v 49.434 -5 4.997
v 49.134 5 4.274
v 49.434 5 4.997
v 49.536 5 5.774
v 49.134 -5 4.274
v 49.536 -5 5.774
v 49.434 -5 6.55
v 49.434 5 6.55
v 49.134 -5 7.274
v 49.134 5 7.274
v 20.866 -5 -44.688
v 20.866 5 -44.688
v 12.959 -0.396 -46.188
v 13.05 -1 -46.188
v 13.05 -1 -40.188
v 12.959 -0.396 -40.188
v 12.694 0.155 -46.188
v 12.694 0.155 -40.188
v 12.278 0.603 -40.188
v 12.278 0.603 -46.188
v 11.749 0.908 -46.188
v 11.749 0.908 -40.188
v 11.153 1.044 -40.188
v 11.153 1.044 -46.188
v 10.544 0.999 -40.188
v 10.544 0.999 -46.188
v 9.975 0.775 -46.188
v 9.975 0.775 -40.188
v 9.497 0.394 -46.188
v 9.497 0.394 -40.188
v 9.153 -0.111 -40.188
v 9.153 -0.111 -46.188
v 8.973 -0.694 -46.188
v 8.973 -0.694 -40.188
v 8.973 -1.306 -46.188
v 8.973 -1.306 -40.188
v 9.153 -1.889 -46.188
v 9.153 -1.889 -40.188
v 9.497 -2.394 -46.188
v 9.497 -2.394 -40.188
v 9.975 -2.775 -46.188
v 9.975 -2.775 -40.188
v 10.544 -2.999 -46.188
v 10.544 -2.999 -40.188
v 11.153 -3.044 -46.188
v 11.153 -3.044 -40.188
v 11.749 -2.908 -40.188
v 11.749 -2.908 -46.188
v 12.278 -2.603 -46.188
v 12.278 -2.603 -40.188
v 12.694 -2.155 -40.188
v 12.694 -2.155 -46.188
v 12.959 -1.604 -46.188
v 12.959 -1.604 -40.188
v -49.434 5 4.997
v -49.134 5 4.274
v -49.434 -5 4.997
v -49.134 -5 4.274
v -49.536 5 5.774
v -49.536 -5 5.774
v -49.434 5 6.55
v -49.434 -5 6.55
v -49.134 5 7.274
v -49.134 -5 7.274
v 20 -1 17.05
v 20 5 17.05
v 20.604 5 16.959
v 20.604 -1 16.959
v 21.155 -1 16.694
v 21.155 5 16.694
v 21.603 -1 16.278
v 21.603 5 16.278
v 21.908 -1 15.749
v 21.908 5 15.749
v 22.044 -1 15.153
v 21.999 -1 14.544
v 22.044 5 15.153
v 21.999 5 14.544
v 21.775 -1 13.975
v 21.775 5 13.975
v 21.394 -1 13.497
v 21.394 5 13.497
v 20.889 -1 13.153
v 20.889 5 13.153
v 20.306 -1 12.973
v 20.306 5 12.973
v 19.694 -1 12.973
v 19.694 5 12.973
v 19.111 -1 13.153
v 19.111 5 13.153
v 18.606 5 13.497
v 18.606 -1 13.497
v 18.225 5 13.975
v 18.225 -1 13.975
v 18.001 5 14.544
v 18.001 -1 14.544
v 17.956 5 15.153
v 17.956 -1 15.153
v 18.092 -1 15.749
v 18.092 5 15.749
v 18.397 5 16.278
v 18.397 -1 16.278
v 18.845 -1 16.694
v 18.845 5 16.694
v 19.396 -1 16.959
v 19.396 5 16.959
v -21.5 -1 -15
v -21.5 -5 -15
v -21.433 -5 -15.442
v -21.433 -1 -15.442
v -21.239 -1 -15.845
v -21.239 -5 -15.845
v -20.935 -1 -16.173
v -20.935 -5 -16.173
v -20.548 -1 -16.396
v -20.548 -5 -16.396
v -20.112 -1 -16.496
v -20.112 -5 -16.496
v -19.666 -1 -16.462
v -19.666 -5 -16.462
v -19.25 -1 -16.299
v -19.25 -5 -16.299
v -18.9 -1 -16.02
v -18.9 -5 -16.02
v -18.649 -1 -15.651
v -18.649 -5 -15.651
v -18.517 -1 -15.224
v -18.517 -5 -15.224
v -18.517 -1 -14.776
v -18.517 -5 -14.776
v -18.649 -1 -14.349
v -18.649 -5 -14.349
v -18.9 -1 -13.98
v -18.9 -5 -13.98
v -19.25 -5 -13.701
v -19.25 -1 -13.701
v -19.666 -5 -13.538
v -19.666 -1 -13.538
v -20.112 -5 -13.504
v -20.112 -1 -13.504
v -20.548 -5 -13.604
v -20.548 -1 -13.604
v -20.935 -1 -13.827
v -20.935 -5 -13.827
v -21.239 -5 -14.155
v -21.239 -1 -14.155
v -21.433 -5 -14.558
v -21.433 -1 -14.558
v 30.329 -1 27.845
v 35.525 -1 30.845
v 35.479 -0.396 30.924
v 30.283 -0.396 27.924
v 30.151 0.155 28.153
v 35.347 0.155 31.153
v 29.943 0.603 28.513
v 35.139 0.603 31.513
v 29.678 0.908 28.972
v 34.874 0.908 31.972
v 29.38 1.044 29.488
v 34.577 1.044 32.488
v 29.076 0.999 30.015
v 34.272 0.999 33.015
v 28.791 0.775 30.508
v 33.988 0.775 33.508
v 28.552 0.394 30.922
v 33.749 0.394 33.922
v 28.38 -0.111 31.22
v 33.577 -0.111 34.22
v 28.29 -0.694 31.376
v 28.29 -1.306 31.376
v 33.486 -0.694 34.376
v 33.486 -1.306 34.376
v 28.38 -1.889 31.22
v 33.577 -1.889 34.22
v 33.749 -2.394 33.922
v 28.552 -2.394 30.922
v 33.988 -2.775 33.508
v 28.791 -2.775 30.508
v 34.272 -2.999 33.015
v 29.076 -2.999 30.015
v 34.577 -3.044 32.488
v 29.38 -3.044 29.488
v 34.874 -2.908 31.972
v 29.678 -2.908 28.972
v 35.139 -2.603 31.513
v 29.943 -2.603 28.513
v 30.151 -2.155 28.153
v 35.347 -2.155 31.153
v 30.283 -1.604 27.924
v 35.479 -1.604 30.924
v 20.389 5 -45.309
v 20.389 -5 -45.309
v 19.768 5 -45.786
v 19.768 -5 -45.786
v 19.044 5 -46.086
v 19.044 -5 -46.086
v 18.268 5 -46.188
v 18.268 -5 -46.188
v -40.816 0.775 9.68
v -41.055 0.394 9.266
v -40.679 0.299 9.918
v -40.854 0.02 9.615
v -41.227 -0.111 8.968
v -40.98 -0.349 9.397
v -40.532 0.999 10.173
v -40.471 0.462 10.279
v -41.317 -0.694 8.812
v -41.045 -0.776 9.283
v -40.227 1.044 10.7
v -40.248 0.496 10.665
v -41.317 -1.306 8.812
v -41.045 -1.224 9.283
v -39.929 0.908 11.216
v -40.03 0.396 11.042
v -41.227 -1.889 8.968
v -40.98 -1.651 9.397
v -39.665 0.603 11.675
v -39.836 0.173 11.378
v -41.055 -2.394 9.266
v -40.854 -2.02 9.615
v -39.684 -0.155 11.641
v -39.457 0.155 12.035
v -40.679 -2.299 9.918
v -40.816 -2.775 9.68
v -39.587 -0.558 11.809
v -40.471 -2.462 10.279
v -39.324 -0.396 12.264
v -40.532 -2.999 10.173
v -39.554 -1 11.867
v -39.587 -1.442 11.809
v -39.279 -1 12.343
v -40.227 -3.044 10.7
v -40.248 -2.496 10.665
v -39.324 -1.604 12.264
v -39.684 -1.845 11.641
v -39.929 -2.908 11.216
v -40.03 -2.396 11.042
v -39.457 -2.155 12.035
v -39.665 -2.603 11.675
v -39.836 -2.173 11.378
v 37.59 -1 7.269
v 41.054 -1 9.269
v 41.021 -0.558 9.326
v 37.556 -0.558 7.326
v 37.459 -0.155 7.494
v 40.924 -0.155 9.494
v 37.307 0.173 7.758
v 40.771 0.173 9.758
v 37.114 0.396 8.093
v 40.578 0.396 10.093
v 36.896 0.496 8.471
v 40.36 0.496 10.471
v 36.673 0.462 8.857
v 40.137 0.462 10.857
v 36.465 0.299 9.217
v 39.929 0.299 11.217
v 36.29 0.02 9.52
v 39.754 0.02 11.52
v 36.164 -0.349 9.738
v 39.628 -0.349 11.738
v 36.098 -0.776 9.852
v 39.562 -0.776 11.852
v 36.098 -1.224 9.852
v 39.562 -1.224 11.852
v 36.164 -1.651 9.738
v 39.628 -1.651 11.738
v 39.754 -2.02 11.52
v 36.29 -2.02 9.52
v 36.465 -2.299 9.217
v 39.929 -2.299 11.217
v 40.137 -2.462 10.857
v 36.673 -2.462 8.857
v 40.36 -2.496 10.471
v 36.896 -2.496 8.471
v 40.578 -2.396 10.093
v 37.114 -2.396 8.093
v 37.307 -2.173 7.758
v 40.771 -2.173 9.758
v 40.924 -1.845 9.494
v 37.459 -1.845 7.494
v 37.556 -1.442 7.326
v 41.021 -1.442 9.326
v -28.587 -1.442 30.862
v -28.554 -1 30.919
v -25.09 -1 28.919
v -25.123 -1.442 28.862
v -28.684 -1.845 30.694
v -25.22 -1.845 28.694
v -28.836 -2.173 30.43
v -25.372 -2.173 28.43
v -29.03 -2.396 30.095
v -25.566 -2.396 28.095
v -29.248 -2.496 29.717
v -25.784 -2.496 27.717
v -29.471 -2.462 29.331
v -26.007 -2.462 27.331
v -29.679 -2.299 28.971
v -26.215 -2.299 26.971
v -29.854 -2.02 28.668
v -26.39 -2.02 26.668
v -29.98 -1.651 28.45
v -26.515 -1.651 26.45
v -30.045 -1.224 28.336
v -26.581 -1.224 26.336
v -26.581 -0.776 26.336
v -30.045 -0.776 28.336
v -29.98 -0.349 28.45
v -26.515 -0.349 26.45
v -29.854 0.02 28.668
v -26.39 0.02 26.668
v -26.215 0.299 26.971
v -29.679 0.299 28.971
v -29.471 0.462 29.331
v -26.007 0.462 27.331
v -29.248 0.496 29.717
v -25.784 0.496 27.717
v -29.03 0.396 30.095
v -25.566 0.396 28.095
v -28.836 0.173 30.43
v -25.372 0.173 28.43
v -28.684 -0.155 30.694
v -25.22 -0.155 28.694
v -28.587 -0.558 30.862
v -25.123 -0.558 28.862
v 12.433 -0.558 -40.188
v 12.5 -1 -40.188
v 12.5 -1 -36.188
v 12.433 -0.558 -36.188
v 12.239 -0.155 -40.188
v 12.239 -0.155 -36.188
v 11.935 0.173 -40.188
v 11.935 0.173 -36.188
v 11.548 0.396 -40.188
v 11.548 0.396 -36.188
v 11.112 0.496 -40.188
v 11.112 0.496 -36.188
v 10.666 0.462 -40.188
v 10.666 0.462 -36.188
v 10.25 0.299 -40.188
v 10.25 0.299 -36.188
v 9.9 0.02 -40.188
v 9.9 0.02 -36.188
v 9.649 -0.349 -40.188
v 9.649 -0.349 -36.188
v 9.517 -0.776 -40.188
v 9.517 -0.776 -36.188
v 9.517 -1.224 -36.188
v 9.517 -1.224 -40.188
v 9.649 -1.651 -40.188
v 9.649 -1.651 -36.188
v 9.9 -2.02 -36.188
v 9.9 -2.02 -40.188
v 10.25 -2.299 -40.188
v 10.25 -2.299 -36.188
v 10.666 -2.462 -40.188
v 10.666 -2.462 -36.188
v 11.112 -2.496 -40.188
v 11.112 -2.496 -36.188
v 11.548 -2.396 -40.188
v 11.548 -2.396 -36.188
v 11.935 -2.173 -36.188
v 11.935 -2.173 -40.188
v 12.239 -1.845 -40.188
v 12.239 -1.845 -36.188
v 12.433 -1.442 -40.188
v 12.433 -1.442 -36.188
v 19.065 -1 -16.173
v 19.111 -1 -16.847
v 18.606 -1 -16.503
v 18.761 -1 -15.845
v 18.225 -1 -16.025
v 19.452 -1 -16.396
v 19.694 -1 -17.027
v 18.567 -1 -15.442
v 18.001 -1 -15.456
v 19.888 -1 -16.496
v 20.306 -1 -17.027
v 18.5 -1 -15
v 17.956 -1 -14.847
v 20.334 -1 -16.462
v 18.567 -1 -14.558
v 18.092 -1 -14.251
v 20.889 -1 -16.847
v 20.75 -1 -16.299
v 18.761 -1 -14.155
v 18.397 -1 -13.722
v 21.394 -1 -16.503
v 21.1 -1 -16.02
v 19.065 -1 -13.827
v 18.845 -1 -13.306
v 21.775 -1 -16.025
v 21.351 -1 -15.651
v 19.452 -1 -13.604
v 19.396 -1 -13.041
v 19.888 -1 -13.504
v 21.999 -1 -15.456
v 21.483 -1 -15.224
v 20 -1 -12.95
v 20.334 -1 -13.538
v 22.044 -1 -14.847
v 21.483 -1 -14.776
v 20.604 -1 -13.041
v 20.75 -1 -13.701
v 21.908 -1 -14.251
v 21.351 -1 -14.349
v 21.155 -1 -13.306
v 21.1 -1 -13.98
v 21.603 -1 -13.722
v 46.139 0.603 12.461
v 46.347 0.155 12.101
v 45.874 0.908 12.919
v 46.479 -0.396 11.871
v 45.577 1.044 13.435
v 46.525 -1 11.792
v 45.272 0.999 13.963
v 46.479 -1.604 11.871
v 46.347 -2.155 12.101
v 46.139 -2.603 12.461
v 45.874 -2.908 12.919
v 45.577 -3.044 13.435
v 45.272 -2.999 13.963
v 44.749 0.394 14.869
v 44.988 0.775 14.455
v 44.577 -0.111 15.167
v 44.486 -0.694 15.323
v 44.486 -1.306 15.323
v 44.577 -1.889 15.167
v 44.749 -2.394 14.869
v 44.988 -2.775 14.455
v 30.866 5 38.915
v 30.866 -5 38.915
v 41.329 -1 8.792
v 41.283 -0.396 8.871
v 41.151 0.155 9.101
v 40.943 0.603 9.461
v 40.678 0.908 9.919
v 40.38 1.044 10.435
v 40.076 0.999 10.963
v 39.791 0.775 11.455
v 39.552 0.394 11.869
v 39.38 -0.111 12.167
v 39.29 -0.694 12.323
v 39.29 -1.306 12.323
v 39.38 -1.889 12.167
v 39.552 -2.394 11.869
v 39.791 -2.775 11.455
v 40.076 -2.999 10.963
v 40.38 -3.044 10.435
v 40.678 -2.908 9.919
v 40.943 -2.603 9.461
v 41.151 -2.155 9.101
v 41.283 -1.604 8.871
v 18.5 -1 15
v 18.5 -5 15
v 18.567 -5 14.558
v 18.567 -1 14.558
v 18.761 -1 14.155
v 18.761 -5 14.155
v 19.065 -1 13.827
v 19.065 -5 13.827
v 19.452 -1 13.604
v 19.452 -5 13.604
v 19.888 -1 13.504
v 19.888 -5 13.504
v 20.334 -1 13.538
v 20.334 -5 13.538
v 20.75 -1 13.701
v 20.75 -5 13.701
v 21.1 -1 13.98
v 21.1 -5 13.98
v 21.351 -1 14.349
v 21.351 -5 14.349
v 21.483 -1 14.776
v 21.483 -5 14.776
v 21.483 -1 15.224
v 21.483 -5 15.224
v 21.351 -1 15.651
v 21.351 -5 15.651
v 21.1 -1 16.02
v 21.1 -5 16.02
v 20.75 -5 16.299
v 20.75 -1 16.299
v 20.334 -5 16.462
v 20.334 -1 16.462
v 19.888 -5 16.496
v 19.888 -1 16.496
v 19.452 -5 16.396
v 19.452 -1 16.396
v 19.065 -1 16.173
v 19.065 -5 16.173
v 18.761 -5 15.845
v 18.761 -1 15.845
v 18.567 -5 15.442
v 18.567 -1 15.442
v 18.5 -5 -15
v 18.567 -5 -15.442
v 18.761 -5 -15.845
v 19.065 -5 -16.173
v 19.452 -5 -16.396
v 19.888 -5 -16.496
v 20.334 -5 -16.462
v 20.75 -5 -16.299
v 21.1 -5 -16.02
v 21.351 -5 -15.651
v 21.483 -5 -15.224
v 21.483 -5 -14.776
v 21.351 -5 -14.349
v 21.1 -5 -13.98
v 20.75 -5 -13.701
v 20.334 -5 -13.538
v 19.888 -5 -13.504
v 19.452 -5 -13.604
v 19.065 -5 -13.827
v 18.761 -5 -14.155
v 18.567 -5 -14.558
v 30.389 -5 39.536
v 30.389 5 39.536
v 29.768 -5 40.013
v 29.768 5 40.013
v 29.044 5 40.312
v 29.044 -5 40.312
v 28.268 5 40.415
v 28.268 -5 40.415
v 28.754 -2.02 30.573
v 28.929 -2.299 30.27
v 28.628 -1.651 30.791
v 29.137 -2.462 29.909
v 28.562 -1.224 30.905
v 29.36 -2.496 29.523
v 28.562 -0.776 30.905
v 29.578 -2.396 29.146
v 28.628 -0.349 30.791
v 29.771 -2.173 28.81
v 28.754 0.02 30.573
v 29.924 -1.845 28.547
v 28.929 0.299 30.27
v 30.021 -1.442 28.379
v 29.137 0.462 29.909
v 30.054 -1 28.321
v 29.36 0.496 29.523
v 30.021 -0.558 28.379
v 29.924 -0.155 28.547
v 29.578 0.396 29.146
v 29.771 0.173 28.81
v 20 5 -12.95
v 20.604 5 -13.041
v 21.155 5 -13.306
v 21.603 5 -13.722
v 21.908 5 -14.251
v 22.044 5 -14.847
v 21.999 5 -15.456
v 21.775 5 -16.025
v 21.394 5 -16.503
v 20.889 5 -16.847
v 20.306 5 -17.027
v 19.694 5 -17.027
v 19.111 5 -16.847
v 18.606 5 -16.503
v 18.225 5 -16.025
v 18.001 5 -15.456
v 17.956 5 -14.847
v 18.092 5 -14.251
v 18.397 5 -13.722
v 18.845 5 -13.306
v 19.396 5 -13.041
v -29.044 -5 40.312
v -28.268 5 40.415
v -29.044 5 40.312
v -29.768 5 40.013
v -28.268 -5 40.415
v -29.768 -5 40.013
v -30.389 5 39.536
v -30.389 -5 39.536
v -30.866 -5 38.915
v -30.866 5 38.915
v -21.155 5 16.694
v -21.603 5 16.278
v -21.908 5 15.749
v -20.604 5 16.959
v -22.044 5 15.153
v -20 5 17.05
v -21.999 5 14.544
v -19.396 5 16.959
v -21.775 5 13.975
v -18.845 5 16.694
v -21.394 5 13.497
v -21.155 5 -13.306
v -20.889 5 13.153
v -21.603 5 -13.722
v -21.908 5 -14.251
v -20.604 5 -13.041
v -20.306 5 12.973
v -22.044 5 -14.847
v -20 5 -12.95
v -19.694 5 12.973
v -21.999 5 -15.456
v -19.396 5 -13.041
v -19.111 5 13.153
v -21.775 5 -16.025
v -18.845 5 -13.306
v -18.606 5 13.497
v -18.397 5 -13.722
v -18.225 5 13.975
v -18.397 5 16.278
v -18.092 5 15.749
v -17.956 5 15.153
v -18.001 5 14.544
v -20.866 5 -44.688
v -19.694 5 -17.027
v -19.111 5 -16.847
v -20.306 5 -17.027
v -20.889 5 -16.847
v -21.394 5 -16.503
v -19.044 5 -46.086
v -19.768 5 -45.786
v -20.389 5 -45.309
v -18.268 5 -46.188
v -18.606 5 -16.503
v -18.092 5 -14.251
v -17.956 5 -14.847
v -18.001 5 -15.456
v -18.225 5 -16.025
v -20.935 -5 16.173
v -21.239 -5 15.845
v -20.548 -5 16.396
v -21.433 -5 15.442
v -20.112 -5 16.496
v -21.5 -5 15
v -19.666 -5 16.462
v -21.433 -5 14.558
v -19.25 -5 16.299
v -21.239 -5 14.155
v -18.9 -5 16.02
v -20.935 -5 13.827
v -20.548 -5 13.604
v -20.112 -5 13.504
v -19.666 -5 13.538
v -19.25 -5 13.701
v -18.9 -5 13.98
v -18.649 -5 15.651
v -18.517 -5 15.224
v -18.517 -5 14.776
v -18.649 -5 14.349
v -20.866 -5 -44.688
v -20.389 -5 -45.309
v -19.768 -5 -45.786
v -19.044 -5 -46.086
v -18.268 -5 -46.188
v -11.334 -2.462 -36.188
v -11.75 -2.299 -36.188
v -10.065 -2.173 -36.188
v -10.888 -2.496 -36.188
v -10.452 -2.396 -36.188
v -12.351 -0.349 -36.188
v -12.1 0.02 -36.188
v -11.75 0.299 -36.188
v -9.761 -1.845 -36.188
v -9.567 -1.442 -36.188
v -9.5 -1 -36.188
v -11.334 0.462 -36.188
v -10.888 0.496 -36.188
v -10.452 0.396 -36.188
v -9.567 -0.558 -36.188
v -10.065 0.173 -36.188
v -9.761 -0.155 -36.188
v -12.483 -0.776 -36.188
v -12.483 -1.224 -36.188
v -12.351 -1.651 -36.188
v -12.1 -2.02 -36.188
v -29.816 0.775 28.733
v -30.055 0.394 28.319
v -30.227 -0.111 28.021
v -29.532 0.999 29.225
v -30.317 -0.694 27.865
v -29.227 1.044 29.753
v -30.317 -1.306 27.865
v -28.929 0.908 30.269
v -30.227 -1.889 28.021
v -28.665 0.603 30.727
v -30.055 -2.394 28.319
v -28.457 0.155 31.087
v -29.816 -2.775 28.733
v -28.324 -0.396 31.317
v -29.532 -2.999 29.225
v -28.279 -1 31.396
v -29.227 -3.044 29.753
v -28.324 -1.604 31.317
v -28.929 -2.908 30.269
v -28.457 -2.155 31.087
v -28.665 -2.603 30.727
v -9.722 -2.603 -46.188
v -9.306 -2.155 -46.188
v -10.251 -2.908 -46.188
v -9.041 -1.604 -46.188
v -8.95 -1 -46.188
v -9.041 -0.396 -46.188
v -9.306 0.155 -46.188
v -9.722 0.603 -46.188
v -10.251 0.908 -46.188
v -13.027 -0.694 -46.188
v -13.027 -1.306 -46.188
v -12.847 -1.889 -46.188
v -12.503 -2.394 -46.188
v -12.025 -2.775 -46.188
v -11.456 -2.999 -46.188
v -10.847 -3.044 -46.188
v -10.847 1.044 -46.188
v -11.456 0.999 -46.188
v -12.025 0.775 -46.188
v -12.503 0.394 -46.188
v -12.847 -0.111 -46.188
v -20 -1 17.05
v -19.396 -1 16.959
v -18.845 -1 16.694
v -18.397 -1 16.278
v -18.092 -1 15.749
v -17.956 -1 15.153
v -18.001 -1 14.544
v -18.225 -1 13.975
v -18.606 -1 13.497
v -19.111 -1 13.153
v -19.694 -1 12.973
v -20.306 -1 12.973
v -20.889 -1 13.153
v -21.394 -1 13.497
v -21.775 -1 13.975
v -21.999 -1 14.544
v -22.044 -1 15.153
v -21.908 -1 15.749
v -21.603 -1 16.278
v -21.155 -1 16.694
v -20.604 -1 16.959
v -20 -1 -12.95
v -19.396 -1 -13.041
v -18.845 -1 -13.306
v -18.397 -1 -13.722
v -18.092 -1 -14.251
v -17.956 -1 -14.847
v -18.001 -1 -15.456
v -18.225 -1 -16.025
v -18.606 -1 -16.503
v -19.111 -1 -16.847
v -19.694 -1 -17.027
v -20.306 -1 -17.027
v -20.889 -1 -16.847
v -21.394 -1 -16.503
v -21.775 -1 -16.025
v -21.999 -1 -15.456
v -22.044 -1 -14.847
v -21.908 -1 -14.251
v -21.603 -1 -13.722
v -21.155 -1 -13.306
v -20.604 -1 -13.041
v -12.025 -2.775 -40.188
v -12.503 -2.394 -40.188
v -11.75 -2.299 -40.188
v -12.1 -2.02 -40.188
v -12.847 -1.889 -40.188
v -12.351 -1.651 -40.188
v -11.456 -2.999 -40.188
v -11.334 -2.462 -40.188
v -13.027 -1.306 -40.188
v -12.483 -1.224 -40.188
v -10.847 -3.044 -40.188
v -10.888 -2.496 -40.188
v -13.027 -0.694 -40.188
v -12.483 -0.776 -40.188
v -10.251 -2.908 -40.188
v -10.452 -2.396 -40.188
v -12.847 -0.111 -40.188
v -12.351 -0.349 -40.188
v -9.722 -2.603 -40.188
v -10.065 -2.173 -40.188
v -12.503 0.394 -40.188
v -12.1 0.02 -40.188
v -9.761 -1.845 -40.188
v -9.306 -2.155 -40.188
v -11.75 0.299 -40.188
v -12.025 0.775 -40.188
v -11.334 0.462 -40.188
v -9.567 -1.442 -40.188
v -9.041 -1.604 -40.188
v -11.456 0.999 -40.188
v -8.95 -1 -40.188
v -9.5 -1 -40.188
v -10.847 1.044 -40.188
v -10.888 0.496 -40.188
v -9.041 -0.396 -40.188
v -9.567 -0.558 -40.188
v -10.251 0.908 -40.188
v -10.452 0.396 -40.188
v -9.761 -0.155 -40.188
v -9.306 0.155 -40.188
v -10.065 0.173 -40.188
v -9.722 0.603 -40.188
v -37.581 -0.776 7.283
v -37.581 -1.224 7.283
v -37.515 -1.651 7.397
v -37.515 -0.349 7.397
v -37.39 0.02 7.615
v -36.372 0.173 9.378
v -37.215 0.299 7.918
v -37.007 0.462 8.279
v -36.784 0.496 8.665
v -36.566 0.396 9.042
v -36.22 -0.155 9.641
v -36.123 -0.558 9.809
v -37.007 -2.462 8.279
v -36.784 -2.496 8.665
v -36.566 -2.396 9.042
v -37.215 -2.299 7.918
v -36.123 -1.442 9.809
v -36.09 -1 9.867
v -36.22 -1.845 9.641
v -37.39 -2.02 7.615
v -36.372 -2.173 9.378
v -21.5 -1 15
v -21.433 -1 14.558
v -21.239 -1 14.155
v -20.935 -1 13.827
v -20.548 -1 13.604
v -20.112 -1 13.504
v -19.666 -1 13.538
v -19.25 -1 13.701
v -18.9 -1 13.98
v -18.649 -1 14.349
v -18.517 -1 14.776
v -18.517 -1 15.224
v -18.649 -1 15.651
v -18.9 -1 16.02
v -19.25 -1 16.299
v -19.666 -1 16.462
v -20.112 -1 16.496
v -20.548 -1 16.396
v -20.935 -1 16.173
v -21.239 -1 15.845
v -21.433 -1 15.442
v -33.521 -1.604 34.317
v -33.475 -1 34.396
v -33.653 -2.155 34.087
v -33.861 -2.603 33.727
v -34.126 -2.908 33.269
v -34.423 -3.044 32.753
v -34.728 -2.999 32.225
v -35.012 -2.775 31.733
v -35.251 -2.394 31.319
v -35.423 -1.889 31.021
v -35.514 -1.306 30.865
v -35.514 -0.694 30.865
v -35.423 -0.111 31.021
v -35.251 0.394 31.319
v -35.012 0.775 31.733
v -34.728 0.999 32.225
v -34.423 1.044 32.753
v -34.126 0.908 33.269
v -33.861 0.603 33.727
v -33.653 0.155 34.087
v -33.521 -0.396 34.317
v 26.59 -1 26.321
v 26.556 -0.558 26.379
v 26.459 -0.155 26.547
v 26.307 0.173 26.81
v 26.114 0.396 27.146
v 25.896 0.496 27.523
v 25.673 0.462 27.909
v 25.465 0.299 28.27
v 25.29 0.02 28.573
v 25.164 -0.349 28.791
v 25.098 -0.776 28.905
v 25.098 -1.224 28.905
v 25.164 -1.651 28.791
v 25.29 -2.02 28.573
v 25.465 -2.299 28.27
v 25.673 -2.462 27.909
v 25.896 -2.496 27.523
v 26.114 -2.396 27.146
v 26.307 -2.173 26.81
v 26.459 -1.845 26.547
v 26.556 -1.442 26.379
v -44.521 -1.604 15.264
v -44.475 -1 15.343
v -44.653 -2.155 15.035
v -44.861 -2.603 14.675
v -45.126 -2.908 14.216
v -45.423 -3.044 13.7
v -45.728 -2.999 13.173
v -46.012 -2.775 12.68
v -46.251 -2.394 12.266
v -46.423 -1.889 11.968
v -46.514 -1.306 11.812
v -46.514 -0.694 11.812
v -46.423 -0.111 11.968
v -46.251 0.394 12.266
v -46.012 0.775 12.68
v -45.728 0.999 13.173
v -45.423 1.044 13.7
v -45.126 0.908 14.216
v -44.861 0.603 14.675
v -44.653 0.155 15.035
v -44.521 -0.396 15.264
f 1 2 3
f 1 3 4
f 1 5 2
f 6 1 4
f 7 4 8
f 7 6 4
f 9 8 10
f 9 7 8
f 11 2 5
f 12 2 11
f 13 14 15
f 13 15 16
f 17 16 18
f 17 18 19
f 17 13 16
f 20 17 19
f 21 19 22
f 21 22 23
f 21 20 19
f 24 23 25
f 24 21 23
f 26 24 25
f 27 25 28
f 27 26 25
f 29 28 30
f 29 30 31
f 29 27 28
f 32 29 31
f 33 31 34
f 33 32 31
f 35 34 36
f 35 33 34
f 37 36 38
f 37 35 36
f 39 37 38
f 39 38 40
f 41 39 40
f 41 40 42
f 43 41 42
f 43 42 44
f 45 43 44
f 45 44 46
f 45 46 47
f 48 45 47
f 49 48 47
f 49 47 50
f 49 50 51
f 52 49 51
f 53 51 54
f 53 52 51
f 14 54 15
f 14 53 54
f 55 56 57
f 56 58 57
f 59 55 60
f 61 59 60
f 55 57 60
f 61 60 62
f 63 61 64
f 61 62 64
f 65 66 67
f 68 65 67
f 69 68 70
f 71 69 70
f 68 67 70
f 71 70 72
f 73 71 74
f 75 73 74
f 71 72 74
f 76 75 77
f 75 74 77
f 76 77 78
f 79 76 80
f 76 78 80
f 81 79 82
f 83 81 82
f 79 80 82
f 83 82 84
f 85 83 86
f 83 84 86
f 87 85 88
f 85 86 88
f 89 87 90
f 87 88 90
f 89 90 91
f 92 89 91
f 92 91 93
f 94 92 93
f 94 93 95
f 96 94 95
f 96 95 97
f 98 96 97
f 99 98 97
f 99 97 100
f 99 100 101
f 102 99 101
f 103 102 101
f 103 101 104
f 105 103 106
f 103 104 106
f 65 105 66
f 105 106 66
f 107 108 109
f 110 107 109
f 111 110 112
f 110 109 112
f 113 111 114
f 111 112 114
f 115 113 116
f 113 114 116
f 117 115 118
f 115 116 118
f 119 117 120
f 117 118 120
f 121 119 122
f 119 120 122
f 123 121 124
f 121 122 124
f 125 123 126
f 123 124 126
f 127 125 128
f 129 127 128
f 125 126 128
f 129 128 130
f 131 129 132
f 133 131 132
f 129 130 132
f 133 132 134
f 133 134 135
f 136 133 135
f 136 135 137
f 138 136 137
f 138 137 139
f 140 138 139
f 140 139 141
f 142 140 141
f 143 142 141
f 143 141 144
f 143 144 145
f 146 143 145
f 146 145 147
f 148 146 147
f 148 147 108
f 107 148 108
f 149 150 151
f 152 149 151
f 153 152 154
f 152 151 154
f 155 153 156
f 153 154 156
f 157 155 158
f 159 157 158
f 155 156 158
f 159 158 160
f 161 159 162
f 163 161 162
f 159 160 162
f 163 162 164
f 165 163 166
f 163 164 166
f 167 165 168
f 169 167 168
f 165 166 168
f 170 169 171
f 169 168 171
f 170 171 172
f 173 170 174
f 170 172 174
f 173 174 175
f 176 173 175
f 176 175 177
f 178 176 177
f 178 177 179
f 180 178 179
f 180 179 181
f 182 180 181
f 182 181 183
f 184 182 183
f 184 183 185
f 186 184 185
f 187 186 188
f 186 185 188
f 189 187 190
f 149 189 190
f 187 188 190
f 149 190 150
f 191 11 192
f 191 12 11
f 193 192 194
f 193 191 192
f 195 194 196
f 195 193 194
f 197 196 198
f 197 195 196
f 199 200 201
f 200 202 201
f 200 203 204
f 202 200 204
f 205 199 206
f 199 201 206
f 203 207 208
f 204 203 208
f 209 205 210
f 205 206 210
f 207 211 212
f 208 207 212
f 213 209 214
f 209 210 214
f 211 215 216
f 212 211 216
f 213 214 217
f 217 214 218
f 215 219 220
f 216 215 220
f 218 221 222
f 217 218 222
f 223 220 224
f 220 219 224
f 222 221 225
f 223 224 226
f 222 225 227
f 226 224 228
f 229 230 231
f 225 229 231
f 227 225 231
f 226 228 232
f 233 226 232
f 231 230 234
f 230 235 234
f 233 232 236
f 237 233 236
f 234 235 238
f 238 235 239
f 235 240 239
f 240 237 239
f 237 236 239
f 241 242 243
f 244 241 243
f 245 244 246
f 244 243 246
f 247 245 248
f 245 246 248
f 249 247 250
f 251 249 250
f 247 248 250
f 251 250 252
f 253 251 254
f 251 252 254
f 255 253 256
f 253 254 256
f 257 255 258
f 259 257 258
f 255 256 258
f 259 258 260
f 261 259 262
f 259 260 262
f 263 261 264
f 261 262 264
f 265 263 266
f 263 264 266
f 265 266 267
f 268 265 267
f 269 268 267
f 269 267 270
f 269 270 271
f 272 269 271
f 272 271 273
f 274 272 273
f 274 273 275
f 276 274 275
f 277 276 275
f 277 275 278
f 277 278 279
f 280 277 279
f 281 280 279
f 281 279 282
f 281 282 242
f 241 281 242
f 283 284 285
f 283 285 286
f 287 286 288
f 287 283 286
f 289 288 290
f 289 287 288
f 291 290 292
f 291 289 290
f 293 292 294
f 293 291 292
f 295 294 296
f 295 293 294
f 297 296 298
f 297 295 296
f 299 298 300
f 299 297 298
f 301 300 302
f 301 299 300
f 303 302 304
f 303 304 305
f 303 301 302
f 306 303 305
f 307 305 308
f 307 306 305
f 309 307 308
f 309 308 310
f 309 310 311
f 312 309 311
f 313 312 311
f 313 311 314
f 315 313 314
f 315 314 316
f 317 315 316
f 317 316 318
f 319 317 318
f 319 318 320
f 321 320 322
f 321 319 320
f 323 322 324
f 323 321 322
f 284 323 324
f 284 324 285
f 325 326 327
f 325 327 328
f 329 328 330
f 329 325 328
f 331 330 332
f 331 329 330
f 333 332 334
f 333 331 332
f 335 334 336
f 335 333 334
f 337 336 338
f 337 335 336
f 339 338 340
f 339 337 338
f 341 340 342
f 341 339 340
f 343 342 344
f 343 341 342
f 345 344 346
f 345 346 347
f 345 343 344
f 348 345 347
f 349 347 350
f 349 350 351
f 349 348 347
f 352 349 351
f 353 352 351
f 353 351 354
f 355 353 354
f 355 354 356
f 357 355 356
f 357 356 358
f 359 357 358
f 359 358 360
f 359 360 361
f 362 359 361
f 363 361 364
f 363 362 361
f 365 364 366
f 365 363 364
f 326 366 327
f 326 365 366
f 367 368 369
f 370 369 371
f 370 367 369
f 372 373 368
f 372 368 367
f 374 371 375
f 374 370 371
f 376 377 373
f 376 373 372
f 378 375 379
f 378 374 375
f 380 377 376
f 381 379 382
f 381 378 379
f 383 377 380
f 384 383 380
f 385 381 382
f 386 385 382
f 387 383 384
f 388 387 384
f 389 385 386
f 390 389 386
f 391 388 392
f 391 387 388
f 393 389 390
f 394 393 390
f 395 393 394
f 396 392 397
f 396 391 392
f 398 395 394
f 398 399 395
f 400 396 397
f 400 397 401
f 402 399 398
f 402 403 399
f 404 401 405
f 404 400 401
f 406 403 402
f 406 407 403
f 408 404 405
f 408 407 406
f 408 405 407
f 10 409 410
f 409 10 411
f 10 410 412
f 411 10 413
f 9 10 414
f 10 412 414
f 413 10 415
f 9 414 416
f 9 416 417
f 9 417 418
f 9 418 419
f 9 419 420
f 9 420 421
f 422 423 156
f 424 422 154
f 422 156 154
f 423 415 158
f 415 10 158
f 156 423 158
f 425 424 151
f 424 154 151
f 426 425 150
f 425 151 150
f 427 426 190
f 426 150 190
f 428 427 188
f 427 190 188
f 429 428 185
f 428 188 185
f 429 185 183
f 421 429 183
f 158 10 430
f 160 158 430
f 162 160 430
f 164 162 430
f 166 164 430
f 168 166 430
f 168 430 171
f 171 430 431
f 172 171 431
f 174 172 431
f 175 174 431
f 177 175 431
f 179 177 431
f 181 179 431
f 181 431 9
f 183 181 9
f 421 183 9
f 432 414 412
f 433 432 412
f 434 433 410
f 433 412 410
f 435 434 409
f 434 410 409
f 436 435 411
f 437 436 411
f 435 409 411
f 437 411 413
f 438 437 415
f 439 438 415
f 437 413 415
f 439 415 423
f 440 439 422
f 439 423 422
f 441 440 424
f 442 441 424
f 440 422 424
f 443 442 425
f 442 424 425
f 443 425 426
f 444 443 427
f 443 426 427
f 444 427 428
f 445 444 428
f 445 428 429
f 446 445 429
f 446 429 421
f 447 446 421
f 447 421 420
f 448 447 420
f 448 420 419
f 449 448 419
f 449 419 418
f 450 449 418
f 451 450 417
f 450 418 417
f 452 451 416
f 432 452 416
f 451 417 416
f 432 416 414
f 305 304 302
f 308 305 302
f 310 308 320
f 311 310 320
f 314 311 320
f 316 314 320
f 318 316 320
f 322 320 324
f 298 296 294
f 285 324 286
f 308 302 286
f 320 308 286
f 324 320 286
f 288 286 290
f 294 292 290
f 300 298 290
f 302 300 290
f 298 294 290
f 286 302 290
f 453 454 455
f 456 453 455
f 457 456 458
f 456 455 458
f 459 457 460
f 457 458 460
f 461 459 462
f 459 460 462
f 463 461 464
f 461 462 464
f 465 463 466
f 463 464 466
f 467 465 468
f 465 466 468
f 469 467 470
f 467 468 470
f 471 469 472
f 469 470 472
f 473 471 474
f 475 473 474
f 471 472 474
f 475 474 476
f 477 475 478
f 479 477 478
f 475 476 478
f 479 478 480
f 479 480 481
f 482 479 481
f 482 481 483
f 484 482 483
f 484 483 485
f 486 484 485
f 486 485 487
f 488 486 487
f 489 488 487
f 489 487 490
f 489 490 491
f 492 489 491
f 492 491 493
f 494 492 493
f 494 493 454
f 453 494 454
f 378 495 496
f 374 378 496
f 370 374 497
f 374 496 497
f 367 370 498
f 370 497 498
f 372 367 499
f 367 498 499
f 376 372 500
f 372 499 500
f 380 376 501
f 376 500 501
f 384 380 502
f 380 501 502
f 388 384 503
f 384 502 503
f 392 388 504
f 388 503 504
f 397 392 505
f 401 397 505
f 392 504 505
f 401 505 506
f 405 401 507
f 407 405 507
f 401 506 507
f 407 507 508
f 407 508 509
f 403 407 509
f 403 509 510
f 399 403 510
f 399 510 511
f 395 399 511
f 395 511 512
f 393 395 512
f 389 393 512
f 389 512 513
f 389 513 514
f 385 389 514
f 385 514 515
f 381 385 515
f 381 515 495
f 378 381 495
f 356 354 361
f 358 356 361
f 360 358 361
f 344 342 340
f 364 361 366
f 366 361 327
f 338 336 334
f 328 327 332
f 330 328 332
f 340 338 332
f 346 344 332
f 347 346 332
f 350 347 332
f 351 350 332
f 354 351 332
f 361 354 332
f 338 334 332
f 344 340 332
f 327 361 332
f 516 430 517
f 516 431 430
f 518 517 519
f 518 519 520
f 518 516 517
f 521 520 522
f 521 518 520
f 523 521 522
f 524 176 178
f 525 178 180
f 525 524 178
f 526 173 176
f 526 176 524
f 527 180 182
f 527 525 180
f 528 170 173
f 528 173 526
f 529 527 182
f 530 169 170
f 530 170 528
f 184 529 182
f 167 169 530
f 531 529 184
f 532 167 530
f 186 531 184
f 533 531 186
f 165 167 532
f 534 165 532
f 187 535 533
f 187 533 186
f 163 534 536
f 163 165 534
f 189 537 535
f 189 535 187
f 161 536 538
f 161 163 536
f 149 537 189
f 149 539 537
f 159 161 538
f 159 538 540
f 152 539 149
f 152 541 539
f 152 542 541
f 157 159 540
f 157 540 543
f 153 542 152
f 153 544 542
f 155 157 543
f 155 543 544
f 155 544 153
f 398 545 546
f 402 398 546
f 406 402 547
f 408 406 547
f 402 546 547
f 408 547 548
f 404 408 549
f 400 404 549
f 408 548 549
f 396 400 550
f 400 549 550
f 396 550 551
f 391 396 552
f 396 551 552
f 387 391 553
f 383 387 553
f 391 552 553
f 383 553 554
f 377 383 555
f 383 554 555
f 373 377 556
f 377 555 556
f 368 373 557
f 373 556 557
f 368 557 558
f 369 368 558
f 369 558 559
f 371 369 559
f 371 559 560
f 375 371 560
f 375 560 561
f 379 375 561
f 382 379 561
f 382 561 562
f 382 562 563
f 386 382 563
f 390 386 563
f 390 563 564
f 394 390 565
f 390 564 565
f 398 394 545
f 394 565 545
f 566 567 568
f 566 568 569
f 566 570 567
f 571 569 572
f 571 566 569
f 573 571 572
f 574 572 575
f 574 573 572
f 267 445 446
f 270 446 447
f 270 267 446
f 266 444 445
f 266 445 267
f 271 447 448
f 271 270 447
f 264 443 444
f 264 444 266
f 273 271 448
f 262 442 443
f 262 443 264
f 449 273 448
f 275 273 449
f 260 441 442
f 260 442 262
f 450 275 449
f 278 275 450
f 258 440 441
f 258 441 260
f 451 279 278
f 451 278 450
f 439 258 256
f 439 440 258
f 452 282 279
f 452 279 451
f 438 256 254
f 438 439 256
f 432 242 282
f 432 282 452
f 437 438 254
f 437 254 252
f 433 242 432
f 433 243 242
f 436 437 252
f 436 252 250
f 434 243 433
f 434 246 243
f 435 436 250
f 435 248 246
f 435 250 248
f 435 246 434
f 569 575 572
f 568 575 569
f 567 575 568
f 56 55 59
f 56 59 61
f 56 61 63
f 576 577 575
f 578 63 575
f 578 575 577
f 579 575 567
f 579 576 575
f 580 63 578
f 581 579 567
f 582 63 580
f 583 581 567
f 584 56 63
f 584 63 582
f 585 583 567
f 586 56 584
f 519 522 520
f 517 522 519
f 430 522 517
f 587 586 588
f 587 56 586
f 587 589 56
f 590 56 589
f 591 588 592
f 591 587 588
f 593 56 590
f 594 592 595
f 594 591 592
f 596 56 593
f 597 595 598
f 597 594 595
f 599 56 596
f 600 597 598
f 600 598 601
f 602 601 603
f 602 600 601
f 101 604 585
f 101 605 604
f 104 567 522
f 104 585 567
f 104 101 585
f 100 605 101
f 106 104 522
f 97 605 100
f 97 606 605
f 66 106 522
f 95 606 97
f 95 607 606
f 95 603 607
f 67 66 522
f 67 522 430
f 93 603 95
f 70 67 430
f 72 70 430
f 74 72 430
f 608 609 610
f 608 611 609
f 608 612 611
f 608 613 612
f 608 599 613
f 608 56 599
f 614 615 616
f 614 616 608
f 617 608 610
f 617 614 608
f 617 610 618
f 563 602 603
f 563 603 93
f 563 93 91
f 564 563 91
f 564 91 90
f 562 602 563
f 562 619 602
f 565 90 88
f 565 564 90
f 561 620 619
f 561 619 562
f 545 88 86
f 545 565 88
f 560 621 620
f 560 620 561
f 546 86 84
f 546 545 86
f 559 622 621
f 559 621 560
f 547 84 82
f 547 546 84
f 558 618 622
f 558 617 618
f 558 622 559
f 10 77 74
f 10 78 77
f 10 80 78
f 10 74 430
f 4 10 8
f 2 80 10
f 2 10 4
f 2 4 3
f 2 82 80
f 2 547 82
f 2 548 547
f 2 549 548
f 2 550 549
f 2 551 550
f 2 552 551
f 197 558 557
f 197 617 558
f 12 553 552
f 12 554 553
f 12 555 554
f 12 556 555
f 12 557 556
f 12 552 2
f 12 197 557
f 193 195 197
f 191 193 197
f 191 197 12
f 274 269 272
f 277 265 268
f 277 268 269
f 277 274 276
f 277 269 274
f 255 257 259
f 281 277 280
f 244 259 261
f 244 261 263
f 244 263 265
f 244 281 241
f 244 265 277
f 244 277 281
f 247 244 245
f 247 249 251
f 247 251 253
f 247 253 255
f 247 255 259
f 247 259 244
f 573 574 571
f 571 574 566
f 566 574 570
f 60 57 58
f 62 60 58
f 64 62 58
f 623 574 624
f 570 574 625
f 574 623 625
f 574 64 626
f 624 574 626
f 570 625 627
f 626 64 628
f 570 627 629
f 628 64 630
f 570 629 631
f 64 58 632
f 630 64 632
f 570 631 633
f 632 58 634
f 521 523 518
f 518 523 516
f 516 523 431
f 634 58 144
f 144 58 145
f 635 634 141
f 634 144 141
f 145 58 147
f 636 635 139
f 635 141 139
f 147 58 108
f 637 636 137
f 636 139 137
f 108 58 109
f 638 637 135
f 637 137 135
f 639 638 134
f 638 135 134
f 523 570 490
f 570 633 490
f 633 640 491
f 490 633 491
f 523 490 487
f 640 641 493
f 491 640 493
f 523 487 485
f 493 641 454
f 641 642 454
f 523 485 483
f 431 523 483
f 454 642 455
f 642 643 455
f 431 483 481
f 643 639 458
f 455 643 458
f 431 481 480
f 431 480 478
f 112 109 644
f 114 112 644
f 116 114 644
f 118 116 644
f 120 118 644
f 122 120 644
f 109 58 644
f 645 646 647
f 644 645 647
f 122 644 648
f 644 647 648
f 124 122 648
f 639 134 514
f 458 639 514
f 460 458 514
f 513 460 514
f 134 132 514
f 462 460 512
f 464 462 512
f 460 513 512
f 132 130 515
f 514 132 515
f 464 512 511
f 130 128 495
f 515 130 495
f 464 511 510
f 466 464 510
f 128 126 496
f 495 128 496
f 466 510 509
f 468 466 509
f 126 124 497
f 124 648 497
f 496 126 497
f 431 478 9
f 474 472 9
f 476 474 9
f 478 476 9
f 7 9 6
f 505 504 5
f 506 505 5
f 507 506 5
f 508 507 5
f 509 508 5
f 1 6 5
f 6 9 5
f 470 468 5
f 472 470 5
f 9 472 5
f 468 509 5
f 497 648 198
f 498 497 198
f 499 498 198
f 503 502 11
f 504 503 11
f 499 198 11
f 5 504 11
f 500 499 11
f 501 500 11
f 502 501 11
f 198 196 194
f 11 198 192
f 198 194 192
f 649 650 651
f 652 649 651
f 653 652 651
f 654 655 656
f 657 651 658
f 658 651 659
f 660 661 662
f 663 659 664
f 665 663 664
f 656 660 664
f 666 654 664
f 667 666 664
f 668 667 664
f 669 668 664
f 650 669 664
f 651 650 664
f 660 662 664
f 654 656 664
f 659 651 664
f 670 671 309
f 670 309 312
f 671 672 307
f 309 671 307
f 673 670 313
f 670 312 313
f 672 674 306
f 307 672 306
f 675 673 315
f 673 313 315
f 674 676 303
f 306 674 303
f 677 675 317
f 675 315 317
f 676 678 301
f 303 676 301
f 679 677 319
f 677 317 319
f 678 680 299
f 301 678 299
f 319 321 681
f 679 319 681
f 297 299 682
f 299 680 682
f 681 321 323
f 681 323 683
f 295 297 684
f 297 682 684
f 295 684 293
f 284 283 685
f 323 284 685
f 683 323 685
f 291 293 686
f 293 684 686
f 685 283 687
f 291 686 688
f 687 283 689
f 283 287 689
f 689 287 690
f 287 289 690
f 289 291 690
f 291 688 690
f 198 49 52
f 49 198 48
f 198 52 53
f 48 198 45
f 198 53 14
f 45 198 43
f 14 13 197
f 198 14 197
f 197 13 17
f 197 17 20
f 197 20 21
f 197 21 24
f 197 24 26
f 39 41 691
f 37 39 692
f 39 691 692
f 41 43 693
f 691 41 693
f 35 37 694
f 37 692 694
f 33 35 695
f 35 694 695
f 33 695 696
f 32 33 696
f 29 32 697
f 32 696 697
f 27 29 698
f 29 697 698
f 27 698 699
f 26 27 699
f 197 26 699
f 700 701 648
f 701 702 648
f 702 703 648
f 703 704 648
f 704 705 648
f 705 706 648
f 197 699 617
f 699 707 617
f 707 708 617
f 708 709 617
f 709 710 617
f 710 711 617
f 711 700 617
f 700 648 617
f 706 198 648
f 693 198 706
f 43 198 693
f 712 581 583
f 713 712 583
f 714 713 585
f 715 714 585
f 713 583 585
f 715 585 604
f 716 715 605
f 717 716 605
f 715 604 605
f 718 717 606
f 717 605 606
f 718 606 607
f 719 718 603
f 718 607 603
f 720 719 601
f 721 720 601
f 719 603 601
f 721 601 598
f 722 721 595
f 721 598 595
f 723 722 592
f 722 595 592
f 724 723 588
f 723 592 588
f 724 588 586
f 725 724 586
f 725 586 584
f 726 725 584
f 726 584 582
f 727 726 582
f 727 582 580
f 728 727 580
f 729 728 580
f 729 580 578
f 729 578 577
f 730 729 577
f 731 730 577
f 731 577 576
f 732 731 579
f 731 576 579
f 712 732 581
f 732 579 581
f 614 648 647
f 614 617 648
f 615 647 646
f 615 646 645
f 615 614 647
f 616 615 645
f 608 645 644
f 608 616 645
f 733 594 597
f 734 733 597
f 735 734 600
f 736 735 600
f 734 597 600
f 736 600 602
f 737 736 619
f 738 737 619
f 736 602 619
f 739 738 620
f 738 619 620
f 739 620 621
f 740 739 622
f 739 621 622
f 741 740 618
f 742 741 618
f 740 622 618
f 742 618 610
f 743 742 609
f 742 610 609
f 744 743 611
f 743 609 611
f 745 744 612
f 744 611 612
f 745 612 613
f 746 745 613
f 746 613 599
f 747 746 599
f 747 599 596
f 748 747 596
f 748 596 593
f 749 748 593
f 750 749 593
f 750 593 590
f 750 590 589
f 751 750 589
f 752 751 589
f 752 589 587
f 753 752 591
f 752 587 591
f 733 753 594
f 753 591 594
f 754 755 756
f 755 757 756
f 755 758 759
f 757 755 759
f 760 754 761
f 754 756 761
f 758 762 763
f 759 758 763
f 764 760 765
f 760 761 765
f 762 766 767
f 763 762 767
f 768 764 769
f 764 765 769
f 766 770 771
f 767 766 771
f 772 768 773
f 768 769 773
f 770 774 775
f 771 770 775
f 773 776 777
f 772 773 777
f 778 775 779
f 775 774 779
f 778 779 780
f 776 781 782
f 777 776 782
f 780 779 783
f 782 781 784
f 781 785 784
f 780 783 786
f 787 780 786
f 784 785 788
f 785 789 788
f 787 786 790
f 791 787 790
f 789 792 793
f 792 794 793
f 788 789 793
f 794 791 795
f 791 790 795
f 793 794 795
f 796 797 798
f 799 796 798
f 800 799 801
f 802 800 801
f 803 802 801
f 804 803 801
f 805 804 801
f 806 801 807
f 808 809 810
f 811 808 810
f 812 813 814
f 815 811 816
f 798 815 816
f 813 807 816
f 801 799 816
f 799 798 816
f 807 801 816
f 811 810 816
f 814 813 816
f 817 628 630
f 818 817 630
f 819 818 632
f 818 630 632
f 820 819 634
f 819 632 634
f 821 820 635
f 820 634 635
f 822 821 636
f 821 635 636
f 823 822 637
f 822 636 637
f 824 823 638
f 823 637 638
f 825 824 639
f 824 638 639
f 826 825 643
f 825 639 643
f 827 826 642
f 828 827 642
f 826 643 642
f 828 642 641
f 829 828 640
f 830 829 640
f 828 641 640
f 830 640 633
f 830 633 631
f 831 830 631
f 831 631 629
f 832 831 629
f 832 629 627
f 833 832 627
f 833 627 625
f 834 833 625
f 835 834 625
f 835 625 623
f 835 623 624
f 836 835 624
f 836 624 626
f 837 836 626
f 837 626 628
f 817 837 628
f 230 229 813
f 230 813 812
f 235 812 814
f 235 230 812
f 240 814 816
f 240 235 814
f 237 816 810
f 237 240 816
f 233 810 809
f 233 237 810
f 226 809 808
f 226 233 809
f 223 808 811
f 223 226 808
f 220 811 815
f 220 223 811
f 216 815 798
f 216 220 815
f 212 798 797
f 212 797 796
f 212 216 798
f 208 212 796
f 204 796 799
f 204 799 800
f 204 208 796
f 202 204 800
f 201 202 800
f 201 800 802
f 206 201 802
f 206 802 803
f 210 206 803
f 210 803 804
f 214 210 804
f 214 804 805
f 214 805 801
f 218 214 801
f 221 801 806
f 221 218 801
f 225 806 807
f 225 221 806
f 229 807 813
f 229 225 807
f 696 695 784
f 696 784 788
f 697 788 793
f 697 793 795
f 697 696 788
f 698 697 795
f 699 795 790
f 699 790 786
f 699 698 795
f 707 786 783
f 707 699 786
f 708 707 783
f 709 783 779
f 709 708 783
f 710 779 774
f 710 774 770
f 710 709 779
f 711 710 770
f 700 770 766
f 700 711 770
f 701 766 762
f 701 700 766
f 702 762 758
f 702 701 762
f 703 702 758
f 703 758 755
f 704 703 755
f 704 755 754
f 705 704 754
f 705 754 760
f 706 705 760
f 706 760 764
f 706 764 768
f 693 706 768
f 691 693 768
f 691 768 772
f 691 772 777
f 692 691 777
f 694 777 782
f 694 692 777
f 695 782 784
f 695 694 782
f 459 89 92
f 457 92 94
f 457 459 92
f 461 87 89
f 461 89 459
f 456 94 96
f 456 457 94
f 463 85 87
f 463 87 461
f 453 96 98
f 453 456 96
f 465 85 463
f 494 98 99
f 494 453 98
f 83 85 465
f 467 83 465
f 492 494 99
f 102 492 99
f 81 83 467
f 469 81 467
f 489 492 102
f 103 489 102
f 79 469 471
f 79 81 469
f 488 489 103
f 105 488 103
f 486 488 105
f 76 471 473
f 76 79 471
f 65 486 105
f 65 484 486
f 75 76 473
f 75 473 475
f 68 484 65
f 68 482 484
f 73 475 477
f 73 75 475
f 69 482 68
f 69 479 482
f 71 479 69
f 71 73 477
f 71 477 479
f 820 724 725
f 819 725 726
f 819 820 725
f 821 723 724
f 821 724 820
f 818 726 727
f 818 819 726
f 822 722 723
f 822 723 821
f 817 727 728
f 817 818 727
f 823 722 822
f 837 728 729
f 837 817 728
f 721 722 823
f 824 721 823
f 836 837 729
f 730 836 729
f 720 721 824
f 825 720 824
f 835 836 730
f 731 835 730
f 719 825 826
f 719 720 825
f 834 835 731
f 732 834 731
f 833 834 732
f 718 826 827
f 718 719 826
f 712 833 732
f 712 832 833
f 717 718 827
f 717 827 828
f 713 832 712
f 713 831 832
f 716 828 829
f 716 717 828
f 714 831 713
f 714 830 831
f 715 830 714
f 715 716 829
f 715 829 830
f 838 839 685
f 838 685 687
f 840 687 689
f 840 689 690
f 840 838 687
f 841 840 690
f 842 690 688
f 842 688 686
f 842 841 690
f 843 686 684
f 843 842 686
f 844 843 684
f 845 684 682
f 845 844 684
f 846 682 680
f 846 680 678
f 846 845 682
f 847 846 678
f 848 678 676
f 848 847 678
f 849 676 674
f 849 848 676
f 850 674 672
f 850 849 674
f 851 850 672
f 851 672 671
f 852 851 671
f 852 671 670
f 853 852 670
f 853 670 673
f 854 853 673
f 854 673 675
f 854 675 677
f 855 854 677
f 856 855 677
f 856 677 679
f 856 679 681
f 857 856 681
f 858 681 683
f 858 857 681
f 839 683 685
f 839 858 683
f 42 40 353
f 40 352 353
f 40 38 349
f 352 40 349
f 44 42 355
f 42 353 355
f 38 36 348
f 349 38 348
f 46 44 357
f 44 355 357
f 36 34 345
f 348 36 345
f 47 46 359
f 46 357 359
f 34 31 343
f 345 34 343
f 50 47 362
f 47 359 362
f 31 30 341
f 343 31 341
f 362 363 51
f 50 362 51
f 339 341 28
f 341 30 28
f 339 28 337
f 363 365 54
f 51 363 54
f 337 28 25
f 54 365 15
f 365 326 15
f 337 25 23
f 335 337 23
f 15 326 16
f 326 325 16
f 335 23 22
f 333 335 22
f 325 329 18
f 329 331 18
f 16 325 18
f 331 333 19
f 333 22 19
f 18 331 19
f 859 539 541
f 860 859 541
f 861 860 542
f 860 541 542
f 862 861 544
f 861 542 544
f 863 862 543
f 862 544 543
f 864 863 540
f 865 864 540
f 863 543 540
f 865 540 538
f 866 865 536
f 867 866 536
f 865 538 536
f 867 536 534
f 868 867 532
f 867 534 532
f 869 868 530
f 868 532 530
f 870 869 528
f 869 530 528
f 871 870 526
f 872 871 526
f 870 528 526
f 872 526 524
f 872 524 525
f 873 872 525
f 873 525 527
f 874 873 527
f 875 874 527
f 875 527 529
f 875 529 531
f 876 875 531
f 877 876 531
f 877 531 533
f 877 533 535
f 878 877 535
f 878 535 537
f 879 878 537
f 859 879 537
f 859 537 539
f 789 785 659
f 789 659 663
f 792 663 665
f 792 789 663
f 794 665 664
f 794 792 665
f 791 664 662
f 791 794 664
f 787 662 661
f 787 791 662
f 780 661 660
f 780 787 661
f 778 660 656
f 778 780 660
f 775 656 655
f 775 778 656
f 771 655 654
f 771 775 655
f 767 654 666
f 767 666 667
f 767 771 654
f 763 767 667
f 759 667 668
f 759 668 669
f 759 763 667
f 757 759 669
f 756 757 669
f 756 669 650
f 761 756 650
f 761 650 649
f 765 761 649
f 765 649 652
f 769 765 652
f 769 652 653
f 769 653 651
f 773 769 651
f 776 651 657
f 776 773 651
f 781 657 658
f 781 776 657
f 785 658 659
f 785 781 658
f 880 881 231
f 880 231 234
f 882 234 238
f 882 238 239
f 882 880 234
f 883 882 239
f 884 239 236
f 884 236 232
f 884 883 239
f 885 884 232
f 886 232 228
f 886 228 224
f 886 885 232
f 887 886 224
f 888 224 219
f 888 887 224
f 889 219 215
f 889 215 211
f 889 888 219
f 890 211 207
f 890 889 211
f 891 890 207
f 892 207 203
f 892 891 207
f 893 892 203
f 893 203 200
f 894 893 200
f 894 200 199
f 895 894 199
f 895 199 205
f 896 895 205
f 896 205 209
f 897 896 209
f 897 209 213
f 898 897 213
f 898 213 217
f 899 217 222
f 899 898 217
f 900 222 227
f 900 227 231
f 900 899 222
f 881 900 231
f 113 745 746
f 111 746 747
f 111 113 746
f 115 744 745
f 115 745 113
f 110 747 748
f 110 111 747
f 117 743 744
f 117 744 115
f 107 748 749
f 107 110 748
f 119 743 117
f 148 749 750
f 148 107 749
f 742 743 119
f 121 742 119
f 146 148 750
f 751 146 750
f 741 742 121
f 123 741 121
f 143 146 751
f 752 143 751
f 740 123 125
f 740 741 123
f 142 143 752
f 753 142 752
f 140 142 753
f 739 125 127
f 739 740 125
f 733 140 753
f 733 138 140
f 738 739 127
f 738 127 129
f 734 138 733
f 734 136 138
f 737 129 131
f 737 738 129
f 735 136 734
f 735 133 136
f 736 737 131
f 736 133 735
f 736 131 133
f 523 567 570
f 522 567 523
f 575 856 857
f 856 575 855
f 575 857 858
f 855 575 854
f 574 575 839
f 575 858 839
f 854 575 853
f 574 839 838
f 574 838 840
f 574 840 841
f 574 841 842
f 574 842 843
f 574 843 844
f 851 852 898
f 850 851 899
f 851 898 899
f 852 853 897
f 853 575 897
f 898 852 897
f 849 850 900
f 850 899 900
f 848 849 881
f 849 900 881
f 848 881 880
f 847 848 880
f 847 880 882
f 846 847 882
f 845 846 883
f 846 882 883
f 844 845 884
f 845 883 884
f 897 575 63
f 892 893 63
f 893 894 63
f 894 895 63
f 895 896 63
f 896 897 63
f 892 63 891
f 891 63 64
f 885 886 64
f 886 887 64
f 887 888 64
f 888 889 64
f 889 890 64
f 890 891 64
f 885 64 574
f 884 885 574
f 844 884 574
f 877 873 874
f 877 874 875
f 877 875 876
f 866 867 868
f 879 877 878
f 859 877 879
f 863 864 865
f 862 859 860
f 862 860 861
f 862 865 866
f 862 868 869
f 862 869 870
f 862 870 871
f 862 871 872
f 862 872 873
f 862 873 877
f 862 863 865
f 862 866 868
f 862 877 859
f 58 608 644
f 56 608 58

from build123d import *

# Parameters (mm, degrees)
BOSS_EXTRUDE1_DEPTH     = 5
CHAMFER1_SIZE           = 40
SKETCH4_R               = 1.5
CUT_EXTRUDE1_DEPTH      = 10
SKETCH10_R              = 2.05
CUT_EXTRUDE3_DEPTH      = 6
CRVPATTERN1_START       = -46.188021535
CRVPATTERN1_OUTLINE_R   = 2.05
CRVPATTERN1_DEPTH       = 6
CRVPATTERN1_START_2     = -40.188021535
CRVPATTERN1_2_OUTLINE_R = 1.5
CRVPATTERN1_2_DEPTH     = 4
CRVPATTERN1_3_OUTLINE_R = 2.05
CRVPATTERN1_3_DEPTH     = 6
CRVPATTERN1_4_OUTLINE_R = 1.5
CRVPATTERN1_4_DEPTH     = 4
F_3_0MM_DOWEL_HOLE1_D   = 3
FILLET1_R               = 3
SKETCH9_R               = 2.05
CUT_EXTRUDE2_DEPTH      = 6


# Read off the part's stored shape, not the designer's step: CrvPattern1
with BuildPart() as part:
    # Sketch2 → Boss-Extrude1 (new, symmetric)
    with BuildSketch(Plane(origin=(0, 0, 0), x_dir=(1, 0, 0), z_dir=(0, 1, 0))):
        Polygon((70, -40.414518843), (0, 80.829037687), (-70, -40.414518843), align=None)
    extrude(amount=BOSS_EXTRUDE1_DEPTH, both=True)

    # Chamfer1
    chamfer1_edges = [part.edges().sort_by_distance(p)[0] for p in [
        (-70, 0, 40.414518843),
        (0, 0, -80.829037687),
        (70, 0, 40.414518843),
    ]]
    chamfer(chamfer1_edges, length=CHAMFER1_SIZE)

    # Sketch4 → Cut-Extrude1 (cut)
    with BuildSketch(Plane(origin=(40, 0, 23.094010768), x_dir=(0.5000000000000004, 0, -0.8660254037844384), z_dir=(0.8660254037844384, 0, 0.5000000000000004))):
        with Locations((-11, -1)):
            Circle(SKETCH4_R)
        with Locations((11, -1)):
            Circle(SKETCH4_R)
    extrude(amount=-CUT_EXTRUDE1_DEPTH, mode=Mode.SUBTRACT)

    # Sketch10 → Cut-Extrude3 (cut)
    with BuildSketch(Plane(origin=(40, 0, 23.094010768), x_dir=(0.4999999999999997, 0, -0.8660254037844388), z_dir=(0.8660254037844389, 0, 0.49999999999999983))):
        with Locations((-11, -1)):
            Circle(SKETCH10_R)
        with Locations((11, -1)):
            Circle(SKETCH10_R)
    extrude(amount=-CUT_EXTRUDE3_DEPTH, mode=Mode.SUBTRACT)

    # CrvPattern1 outline → CrvPattern1 (cut)
    with BuildSketch(Plane.XY.offset(CRVPATTERN1_START)):
        with Locations((11, -1)):
            Circle(CRVPATTERN1_OUTLINE_R)
        with Locations((-11, -1)):
            Circle(CRVPATTERN1_OUTLINE_R)
    extrude(amount=CRVPATTERN1_DEPTH, mode=Mode.SUBTRACT)

    # CrvPattern1 2 outline → CrvPattern1 2 (cut)
    with BuildSketch(Plane.XY.offset(CRVPATTERN1_START_2)):
        with Locations((11, -1)):
            Circle(CRVPATTERN1_2_OUTLINE_R)
        with Locations((-11, -1)):
            Circle(CRVPATTERN1_2_OUTLINE_R)
    extrude(amount=CRVPATTERN1_2_DEPTH, mode=Mode.SUBTRACT)

    # CrvPattern1 3 outline → CrvPattern1 3 (cut)
    with BuildSketch(Plane(origin=(0, 0, 0), x_dir=(0.500000000000013, 0, 0.8660254037844313), z_dir=(0.8660254037844312, 0, -0.5000000000000131)).offset(CRVPATTERN1_START)):
        with Locations((-11, 1)):
            Circle(CRVPATTERN1_3_OUTLINE_R)
        with Locations((11, 1)):
            Circle(CRVPATTERN1_3_OUTLINE_R)
    extrude(amount=CRVPATTERN1_3_DEPTH, mode=Mode.SUBTRACT)

    # CrvPattern1 4 outline → CrvPattern1 4 (cut)
    with BuildSketch(Plane(origin=(0, 0, 0), x_dir=(0.500000000000013, 0, 0.8660254037844313), z_dir=(0.8660254037844312, 0, -0.5000000000000131)).offset(CRVPATTERN1_START_2)):
        with Locations((-11, 1)):
            Circle(CRVPATTERN1_4_OUTLINE_R)
        with Locations((11, 1)):
            Circle(CRVPATTERN1_4_OUTLINE_R)
    extrude(amount=CRVPATTERN1_4_DEPTH, mode=Mode.SUBTRACT)

    # Ø3.0mm Dowel Hole1 (through all)
    with Locations(Plane(origin=(0, 5, 0), x_dir=(1, 0, 0), z_dir=(0, 1, 0))):
        with Locations((-20, 15), (20, 15), (20, -15), (-20, -15)):
            Hole(F_3_0MM_DOWEL_HOLE1_D / 2)

    # Fillet1
    fillet1_edges = [part.edges().sort_by_distance(p)[0] for p in [
        (20, 0, -46.188021535),
        (50, 0, 5.773502692),
        (-30, 0, 40.414518843),
        (30, 0, 40.414518843),
        (-50, 0, 5.773502692),
        (-20, 0, -46.188021535),
    ]]
    fillet(fillet1_edges, radius=FILLET1_R)

    # Sketch9 → Cut-Extrude2 (cut)
    with BuildSketch(Plane(origin=(0, 5, 0), x_dir=(1, 0, 0), z_dir=(0, 1, 0))):
        with Locations(Location((-20, 15, 0), (0, 0, 270))):
            Circle(SKETCH9_R)
        with Locations(Location((20, 15, 0), (0, 0, 270))):
            Circle(SKETCH9_R)
        with Locations(Location((20, -15, 0), (0, 0, 270))):
            Circle(SKETCH9_R)
        with Locations(Location((-20, -15, 0), (0, 0, 270))):
            Circle(SKETCH9_R)
    extrude(amount=-CUT_EXTRUDE2_DEPTH, mode=Mode.SUBTRACT)


solid = part.part
